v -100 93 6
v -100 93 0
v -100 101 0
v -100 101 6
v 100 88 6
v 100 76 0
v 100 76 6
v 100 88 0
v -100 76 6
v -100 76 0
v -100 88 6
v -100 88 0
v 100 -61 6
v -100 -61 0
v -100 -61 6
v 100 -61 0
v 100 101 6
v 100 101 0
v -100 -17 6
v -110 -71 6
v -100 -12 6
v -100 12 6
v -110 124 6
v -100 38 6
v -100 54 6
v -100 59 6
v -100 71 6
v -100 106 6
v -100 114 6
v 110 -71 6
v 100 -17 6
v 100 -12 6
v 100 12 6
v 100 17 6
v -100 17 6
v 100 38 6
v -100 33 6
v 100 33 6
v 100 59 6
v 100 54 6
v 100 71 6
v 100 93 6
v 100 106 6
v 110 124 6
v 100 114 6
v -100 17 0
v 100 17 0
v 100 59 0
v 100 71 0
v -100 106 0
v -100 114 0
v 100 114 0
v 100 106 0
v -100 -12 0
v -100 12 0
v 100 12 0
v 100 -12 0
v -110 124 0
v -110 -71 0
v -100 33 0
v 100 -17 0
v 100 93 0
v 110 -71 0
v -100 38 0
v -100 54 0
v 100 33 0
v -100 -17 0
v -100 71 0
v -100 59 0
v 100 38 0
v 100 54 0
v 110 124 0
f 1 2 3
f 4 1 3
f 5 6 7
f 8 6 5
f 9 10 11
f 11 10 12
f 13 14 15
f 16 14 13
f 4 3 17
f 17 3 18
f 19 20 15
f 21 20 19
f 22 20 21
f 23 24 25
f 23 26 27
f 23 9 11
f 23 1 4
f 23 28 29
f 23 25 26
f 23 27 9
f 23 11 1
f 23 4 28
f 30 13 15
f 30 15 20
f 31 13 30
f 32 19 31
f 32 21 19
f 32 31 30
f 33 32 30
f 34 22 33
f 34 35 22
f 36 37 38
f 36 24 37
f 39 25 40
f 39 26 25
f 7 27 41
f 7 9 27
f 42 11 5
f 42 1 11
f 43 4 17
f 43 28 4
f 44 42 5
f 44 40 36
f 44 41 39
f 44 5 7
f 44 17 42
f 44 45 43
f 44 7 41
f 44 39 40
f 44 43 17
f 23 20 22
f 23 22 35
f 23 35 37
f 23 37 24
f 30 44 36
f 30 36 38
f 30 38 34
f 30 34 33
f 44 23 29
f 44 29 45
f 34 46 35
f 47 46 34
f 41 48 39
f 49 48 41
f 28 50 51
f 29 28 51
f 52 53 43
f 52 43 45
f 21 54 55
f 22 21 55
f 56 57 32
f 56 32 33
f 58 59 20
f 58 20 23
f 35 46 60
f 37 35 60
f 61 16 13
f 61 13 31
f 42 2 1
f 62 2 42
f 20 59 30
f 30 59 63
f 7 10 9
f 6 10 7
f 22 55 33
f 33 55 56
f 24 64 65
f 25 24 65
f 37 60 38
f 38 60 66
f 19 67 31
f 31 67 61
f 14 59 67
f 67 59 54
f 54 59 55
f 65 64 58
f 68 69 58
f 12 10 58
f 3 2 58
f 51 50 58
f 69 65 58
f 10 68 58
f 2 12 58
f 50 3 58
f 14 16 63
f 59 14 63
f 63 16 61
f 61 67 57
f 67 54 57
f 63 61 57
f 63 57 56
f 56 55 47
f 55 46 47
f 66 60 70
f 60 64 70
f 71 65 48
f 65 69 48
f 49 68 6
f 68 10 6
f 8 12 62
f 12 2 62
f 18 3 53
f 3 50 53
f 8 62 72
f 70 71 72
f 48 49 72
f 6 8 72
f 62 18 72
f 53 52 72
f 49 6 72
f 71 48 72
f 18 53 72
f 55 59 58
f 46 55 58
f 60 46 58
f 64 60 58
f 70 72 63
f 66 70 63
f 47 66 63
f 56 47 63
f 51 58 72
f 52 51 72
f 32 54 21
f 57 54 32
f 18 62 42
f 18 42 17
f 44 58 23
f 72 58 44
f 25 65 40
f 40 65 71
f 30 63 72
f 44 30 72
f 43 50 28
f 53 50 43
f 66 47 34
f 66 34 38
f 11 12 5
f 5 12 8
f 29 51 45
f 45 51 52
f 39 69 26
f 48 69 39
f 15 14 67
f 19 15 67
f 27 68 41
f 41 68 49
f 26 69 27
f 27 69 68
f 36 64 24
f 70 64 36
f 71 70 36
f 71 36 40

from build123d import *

# Parameters (mm, degrees)
SKETCH_1_W      = 220
SKETCH_1_H      = 195
SKETCH_1_W_2    = 200
SKETCH_1_H_2    = 8
SKETCH_1_H_3    = 12
SKETCH_1_H_4    = 16
SKETCH_1_H_5    = 24
SKETCH_1_H_6    = 44
EXTRUDE_1_DEPTH = 6


with BuildPart() as part:
    # Эскиз1 → Бобышка-Вытянуть1 (new body)
    with BuildSketch(Plane.XY):
        with Locations((0, 26.5)):
            Rectangle(SKETCH_1_W, SKETCH_1_H)
        with Locations((0, 110)):
            Rectangle(SKETCH_1_W_2, SKETCH_1_H_2, mode=Mode.SUBTRACT)
        with Locations((0, 97)):
            Rectangle(SKETCH_1_W_2, SKETCH_1_H_2, mode=Mode.SUBTRACT)
        with Locations((0, 82)):
            Rectangle(SKETCH_1_W_2, SKETCH_1_H_3, mode=Mode.SUBTRACT)
        with Locations((0, 65)):
            Rectangle(SKETCH_1_W_2, SKETCH_1_H_3, mode=Mode.SUBTRACT)
        with Locations((0, 46)):
            Rectangle(SKETCH_1_W_2, SKETCH_1_H_4, mode=Mode.SUBTRACT)
        with Locations((0, 25)):
            Rectangle(SKETCH_1_W_2, SKETCH_1_H_4, mode=Mode.SUBTRACT)
        Rectangle(SKETCH_1_W_2, SKETCH_1_H_5, mode=Mode.SUBTRACT)
        with Locations((0, -39)):
            Rectangle(SKETCH_1_W_2, SKETCH_1_H_6, mode=Mode.SUBTRACT)
    extrude(amount=EXTRUDE_1_DEPTH)


solid = part.part
